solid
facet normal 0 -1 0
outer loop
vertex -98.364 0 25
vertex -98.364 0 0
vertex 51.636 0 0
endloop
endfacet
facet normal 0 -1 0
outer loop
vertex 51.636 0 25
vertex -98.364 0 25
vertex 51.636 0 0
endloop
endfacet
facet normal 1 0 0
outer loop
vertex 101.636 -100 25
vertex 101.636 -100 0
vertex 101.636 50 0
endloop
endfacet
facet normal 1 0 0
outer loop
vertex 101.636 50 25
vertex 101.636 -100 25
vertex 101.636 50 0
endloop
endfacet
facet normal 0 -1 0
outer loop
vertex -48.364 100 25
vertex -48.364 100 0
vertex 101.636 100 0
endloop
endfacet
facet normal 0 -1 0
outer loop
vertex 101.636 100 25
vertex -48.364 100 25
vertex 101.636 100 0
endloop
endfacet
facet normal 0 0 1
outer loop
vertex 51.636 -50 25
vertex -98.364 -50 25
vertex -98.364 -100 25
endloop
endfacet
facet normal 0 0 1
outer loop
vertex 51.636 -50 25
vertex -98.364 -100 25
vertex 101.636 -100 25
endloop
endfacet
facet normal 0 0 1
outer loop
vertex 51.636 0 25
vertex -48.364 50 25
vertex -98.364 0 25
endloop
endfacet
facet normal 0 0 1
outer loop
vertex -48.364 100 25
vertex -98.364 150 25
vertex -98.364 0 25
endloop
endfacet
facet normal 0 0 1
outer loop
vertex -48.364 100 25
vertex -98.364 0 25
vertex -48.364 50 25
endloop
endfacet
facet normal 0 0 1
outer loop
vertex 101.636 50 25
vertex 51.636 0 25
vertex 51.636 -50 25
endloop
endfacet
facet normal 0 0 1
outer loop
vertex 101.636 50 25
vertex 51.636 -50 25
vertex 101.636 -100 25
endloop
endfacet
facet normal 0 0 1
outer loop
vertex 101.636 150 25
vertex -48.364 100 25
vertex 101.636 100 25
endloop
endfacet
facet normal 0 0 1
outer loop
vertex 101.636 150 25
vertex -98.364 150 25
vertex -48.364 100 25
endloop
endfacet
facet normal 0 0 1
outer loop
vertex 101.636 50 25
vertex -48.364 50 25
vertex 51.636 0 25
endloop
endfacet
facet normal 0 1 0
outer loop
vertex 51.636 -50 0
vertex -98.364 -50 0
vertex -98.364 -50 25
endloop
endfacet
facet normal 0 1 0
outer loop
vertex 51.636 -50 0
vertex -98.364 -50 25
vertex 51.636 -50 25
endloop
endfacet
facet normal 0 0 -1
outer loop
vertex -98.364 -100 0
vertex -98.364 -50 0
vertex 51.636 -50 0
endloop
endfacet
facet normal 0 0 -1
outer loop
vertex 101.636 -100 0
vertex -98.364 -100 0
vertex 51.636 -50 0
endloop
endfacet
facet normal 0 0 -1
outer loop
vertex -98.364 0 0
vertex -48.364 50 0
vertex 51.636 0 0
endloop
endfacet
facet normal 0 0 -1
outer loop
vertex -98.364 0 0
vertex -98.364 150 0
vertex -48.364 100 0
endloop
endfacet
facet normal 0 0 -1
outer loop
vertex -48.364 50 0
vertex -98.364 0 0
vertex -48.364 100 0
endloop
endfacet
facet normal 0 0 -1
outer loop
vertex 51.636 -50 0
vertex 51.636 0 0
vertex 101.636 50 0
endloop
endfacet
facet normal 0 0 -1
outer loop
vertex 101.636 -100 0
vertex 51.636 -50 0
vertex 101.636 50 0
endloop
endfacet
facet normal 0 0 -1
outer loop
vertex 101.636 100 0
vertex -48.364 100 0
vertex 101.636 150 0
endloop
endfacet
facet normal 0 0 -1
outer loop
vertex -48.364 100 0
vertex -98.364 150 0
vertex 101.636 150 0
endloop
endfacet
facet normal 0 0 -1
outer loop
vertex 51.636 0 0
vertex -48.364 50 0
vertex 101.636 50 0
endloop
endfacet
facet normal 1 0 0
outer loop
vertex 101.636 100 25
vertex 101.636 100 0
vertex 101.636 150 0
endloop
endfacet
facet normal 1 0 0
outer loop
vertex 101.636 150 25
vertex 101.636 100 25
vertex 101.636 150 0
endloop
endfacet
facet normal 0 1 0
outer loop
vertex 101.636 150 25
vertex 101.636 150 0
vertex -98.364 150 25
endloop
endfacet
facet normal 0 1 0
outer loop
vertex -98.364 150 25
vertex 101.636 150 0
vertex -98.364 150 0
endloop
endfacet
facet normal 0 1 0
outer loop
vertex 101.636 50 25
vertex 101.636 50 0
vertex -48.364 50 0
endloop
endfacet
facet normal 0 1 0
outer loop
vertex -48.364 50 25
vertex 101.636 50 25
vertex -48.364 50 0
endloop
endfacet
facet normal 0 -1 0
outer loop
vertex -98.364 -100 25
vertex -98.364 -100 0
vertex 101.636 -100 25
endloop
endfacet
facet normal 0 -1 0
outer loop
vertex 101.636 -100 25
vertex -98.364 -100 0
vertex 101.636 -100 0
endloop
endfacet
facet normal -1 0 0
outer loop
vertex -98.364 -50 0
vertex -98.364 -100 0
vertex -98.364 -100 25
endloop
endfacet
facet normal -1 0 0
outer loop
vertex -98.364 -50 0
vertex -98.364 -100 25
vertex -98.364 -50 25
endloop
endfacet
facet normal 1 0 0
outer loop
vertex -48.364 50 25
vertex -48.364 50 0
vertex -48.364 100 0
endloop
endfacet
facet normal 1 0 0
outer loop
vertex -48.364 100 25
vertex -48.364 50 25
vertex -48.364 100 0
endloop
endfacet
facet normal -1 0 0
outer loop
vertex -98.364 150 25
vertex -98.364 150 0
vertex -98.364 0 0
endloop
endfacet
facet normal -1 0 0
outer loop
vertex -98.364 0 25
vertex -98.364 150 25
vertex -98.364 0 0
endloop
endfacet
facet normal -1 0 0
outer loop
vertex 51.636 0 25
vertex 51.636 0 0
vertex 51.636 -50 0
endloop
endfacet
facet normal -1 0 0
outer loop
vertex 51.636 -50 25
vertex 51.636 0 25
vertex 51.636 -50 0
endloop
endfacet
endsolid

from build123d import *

# Parameters (mm, degrees)
F0_W     = 150
F0_H     = 50
F0_W_2   = 50
F0_W_3   = 100
F1_DEPTH = 25


with BuildPart() as f1:
    # F0 (on Top) → F1 (new body)
    with BuildSketch(Plane.XY):
        with Locations((26.636132, 125)):
            Rectangle(F0_W, F0_H)
        with Locations((-73.363868, 125)):
            Rectangle(F0_W_2, F0_H)
        with Locations((-73.363868, 75)):
            Rectangle(F0_W_2, F0_H)
        with Locations((1.636132, 25)):
            Rectangle(F0_W_3, F0_H)
        with Locations((-73.363868, 25)):
            Rectangle(F0_W_2, F0_H)
        with Locations((76.636132, 25)):
            Rectangle(F0_W_2, F0_H)
        with Locations((76.636132, -25)):
            Rectangle(F0_W_2, F0_H)
        with Locations((76.636132, -75)):
            Rectangle(F0_W_2, F0_H)
        with Locations((-23.363868, -75)):
            Rectangle(F0_W, F0_H)
    extrude(amount=F1_DEPTH)


solid = f1.part
